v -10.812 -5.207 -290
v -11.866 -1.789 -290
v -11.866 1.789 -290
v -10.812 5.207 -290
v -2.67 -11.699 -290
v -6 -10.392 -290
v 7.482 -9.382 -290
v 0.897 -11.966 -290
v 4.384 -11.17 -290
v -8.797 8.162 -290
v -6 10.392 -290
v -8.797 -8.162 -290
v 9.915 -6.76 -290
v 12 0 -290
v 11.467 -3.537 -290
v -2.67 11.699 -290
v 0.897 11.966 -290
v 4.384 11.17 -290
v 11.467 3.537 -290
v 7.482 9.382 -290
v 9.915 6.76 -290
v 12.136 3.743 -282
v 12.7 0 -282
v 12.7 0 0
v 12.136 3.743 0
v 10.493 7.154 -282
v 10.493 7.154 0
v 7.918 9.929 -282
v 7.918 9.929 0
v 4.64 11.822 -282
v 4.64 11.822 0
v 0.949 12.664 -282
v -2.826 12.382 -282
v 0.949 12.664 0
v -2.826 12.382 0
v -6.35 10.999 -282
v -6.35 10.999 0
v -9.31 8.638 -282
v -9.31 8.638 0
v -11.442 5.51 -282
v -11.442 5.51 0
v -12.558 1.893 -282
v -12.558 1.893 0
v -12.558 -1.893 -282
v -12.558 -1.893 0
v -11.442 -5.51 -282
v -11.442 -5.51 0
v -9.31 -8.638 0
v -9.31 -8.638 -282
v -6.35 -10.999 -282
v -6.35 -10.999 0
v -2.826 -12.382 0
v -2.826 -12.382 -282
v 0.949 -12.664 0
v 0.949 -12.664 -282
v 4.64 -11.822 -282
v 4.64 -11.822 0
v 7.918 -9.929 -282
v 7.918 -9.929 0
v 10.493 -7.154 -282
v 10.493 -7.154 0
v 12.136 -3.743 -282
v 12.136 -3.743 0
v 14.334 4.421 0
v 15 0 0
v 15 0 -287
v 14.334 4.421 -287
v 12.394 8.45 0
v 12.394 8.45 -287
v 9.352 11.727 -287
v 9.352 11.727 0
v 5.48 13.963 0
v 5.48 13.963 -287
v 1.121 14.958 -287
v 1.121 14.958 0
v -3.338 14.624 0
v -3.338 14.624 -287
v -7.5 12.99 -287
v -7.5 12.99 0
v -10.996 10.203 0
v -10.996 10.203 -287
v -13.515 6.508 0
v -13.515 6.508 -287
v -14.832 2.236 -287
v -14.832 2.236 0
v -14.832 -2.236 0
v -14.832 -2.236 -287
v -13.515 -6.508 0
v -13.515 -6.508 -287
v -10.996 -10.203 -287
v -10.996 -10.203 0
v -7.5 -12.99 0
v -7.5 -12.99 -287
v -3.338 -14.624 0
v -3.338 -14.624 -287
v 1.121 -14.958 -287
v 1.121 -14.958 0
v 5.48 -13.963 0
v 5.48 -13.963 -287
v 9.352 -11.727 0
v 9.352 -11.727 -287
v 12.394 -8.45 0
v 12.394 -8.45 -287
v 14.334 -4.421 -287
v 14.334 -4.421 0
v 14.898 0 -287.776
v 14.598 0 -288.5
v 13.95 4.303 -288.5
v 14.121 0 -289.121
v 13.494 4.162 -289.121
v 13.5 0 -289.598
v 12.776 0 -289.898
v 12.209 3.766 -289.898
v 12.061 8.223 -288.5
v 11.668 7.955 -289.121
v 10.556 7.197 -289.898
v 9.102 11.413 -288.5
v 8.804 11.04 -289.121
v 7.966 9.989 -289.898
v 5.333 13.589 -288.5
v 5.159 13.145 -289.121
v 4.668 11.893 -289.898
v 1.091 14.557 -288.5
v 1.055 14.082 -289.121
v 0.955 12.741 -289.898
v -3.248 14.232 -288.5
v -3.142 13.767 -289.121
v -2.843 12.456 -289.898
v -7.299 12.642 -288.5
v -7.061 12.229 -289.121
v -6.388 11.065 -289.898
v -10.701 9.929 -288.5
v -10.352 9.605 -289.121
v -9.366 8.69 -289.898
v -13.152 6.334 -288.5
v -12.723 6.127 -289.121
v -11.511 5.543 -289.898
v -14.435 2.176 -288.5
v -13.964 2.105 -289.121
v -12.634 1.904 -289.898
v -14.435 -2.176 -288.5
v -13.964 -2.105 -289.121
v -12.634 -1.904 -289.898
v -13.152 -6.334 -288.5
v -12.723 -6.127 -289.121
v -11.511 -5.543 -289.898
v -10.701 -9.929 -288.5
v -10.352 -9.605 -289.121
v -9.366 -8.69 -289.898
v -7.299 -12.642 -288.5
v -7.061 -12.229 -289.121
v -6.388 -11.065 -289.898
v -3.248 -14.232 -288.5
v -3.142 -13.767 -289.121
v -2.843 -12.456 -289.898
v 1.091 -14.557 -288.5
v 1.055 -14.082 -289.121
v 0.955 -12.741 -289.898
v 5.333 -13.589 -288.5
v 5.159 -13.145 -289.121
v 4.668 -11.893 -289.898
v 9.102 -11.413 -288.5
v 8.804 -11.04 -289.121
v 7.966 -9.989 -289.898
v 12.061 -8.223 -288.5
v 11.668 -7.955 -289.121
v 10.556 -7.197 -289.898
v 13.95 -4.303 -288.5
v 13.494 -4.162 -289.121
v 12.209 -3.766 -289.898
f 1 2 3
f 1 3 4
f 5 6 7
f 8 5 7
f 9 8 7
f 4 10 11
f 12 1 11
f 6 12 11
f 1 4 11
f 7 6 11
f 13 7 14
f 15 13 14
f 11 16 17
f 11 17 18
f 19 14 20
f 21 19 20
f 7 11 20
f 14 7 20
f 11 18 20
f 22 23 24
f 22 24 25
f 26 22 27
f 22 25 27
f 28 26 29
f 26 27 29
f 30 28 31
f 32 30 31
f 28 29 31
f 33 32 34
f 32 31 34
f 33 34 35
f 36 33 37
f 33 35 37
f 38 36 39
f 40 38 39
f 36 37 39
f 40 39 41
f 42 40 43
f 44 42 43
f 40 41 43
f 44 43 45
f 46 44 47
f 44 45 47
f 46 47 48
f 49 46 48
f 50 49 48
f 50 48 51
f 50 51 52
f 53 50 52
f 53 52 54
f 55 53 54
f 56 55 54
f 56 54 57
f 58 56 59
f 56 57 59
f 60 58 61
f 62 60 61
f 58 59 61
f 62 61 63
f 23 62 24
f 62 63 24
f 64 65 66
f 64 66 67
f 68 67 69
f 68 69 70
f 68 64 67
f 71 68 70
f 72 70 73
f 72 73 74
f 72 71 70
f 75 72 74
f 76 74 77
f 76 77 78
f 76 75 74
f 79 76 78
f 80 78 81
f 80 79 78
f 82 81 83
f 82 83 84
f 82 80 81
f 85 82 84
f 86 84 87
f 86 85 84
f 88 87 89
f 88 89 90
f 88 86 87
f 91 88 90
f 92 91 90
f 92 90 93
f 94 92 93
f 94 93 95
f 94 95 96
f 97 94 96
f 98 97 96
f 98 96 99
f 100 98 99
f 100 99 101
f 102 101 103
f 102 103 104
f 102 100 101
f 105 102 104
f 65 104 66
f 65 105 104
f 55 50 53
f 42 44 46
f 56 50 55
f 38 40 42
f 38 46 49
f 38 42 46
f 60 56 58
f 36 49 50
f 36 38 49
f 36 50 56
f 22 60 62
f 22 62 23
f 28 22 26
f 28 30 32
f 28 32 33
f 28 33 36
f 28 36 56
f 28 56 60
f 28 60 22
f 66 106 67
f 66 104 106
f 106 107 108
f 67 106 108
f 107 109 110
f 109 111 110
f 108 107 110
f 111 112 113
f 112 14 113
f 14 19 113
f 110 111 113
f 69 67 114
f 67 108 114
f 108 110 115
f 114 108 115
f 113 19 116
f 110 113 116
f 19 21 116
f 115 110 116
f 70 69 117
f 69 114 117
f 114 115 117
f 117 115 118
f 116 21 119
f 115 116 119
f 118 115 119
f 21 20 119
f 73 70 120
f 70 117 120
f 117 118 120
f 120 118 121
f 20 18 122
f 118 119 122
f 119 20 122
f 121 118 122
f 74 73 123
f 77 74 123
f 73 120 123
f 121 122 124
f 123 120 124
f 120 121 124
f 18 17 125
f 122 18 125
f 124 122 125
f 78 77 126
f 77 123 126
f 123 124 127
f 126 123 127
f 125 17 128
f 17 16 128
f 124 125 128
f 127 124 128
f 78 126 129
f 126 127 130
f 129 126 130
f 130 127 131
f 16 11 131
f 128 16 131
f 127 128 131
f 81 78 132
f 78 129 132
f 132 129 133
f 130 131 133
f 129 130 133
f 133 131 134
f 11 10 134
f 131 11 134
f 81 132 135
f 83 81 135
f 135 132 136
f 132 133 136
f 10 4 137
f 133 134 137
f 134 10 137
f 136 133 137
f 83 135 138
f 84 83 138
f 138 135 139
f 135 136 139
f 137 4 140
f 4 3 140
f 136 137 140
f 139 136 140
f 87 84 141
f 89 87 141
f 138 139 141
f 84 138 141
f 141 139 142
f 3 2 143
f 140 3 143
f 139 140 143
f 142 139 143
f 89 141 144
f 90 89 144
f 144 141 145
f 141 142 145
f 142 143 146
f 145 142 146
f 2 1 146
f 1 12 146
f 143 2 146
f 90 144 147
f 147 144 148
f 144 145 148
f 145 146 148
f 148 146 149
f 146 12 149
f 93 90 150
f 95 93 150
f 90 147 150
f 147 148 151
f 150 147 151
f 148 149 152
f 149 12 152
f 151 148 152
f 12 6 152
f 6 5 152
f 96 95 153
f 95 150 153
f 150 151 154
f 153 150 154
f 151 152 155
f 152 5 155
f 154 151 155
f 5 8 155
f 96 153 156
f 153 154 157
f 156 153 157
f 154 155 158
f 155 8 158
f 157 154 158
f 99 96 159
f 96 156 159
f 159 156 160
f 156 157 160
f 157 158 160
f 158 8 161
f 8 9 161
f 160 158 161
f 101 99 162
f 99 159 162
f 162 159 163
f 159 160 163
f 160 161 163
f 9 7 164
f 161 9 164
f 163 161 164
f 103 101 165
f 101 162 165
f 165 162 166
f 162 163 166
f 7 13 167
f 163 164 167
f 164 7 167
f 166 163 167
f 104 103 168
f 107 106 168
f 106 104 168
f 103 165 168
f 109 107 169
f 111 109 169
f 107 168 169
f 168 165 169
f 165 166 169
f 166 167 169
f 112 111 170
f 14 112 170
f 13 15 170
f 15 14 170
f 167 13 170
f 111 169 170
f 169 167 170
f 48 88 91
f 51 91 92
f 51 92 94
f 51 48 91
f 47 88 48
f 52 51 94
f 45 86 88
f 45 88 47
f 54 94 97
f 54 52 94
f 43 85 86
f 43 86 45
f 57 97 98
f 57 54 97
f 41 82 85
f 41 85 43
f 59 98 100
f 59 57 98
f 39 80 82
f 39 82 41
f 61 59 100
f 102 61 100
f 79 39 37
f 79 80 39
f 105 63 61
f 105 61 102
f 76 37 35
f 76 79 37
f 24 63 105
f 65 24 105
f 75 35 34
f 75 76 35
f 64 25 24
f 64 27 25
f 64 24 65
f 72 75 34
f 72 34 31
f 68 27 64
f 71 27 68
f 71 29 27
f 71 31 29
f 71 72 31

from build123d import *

# Parameters (mm, degrees)
CROQUIS2_R              = 15
SALIENTE_EXTRUIR1_DEPTH = 290
CROQUIS3_R              = 12.7
CORTAR_EXTRUIR1_DEPTH   = 282
REDONDEO1_R             = 3


with BuildPart() as part:
    # Croquis2 → Saliente-Extruir1 (new body)
    with BuildSketch(Plane.XY):
        Circle(CROQUIS2_R)
    extrude(amount=-SALIENTE_EXTRUIR1_DEPTH)

    # Croquis3 → Cortar-Extruir1 (cut)
    with BuildSketch(Plane.XY):
        Circle(CROQUIS3_R)
    extrude(amount=-CORTAR_EXTRUIR1_DEPTH, mode=Mode.SUBTRACT)

    # Redondeo1
    redondeo1_edges = [part.edges().sort_by_distance(p)[0] for p in [
        (-15, 0, -290),
    ]]
    fillet(redondeo1_edges, radius=REDONDEO1_R)


solid = part.part
